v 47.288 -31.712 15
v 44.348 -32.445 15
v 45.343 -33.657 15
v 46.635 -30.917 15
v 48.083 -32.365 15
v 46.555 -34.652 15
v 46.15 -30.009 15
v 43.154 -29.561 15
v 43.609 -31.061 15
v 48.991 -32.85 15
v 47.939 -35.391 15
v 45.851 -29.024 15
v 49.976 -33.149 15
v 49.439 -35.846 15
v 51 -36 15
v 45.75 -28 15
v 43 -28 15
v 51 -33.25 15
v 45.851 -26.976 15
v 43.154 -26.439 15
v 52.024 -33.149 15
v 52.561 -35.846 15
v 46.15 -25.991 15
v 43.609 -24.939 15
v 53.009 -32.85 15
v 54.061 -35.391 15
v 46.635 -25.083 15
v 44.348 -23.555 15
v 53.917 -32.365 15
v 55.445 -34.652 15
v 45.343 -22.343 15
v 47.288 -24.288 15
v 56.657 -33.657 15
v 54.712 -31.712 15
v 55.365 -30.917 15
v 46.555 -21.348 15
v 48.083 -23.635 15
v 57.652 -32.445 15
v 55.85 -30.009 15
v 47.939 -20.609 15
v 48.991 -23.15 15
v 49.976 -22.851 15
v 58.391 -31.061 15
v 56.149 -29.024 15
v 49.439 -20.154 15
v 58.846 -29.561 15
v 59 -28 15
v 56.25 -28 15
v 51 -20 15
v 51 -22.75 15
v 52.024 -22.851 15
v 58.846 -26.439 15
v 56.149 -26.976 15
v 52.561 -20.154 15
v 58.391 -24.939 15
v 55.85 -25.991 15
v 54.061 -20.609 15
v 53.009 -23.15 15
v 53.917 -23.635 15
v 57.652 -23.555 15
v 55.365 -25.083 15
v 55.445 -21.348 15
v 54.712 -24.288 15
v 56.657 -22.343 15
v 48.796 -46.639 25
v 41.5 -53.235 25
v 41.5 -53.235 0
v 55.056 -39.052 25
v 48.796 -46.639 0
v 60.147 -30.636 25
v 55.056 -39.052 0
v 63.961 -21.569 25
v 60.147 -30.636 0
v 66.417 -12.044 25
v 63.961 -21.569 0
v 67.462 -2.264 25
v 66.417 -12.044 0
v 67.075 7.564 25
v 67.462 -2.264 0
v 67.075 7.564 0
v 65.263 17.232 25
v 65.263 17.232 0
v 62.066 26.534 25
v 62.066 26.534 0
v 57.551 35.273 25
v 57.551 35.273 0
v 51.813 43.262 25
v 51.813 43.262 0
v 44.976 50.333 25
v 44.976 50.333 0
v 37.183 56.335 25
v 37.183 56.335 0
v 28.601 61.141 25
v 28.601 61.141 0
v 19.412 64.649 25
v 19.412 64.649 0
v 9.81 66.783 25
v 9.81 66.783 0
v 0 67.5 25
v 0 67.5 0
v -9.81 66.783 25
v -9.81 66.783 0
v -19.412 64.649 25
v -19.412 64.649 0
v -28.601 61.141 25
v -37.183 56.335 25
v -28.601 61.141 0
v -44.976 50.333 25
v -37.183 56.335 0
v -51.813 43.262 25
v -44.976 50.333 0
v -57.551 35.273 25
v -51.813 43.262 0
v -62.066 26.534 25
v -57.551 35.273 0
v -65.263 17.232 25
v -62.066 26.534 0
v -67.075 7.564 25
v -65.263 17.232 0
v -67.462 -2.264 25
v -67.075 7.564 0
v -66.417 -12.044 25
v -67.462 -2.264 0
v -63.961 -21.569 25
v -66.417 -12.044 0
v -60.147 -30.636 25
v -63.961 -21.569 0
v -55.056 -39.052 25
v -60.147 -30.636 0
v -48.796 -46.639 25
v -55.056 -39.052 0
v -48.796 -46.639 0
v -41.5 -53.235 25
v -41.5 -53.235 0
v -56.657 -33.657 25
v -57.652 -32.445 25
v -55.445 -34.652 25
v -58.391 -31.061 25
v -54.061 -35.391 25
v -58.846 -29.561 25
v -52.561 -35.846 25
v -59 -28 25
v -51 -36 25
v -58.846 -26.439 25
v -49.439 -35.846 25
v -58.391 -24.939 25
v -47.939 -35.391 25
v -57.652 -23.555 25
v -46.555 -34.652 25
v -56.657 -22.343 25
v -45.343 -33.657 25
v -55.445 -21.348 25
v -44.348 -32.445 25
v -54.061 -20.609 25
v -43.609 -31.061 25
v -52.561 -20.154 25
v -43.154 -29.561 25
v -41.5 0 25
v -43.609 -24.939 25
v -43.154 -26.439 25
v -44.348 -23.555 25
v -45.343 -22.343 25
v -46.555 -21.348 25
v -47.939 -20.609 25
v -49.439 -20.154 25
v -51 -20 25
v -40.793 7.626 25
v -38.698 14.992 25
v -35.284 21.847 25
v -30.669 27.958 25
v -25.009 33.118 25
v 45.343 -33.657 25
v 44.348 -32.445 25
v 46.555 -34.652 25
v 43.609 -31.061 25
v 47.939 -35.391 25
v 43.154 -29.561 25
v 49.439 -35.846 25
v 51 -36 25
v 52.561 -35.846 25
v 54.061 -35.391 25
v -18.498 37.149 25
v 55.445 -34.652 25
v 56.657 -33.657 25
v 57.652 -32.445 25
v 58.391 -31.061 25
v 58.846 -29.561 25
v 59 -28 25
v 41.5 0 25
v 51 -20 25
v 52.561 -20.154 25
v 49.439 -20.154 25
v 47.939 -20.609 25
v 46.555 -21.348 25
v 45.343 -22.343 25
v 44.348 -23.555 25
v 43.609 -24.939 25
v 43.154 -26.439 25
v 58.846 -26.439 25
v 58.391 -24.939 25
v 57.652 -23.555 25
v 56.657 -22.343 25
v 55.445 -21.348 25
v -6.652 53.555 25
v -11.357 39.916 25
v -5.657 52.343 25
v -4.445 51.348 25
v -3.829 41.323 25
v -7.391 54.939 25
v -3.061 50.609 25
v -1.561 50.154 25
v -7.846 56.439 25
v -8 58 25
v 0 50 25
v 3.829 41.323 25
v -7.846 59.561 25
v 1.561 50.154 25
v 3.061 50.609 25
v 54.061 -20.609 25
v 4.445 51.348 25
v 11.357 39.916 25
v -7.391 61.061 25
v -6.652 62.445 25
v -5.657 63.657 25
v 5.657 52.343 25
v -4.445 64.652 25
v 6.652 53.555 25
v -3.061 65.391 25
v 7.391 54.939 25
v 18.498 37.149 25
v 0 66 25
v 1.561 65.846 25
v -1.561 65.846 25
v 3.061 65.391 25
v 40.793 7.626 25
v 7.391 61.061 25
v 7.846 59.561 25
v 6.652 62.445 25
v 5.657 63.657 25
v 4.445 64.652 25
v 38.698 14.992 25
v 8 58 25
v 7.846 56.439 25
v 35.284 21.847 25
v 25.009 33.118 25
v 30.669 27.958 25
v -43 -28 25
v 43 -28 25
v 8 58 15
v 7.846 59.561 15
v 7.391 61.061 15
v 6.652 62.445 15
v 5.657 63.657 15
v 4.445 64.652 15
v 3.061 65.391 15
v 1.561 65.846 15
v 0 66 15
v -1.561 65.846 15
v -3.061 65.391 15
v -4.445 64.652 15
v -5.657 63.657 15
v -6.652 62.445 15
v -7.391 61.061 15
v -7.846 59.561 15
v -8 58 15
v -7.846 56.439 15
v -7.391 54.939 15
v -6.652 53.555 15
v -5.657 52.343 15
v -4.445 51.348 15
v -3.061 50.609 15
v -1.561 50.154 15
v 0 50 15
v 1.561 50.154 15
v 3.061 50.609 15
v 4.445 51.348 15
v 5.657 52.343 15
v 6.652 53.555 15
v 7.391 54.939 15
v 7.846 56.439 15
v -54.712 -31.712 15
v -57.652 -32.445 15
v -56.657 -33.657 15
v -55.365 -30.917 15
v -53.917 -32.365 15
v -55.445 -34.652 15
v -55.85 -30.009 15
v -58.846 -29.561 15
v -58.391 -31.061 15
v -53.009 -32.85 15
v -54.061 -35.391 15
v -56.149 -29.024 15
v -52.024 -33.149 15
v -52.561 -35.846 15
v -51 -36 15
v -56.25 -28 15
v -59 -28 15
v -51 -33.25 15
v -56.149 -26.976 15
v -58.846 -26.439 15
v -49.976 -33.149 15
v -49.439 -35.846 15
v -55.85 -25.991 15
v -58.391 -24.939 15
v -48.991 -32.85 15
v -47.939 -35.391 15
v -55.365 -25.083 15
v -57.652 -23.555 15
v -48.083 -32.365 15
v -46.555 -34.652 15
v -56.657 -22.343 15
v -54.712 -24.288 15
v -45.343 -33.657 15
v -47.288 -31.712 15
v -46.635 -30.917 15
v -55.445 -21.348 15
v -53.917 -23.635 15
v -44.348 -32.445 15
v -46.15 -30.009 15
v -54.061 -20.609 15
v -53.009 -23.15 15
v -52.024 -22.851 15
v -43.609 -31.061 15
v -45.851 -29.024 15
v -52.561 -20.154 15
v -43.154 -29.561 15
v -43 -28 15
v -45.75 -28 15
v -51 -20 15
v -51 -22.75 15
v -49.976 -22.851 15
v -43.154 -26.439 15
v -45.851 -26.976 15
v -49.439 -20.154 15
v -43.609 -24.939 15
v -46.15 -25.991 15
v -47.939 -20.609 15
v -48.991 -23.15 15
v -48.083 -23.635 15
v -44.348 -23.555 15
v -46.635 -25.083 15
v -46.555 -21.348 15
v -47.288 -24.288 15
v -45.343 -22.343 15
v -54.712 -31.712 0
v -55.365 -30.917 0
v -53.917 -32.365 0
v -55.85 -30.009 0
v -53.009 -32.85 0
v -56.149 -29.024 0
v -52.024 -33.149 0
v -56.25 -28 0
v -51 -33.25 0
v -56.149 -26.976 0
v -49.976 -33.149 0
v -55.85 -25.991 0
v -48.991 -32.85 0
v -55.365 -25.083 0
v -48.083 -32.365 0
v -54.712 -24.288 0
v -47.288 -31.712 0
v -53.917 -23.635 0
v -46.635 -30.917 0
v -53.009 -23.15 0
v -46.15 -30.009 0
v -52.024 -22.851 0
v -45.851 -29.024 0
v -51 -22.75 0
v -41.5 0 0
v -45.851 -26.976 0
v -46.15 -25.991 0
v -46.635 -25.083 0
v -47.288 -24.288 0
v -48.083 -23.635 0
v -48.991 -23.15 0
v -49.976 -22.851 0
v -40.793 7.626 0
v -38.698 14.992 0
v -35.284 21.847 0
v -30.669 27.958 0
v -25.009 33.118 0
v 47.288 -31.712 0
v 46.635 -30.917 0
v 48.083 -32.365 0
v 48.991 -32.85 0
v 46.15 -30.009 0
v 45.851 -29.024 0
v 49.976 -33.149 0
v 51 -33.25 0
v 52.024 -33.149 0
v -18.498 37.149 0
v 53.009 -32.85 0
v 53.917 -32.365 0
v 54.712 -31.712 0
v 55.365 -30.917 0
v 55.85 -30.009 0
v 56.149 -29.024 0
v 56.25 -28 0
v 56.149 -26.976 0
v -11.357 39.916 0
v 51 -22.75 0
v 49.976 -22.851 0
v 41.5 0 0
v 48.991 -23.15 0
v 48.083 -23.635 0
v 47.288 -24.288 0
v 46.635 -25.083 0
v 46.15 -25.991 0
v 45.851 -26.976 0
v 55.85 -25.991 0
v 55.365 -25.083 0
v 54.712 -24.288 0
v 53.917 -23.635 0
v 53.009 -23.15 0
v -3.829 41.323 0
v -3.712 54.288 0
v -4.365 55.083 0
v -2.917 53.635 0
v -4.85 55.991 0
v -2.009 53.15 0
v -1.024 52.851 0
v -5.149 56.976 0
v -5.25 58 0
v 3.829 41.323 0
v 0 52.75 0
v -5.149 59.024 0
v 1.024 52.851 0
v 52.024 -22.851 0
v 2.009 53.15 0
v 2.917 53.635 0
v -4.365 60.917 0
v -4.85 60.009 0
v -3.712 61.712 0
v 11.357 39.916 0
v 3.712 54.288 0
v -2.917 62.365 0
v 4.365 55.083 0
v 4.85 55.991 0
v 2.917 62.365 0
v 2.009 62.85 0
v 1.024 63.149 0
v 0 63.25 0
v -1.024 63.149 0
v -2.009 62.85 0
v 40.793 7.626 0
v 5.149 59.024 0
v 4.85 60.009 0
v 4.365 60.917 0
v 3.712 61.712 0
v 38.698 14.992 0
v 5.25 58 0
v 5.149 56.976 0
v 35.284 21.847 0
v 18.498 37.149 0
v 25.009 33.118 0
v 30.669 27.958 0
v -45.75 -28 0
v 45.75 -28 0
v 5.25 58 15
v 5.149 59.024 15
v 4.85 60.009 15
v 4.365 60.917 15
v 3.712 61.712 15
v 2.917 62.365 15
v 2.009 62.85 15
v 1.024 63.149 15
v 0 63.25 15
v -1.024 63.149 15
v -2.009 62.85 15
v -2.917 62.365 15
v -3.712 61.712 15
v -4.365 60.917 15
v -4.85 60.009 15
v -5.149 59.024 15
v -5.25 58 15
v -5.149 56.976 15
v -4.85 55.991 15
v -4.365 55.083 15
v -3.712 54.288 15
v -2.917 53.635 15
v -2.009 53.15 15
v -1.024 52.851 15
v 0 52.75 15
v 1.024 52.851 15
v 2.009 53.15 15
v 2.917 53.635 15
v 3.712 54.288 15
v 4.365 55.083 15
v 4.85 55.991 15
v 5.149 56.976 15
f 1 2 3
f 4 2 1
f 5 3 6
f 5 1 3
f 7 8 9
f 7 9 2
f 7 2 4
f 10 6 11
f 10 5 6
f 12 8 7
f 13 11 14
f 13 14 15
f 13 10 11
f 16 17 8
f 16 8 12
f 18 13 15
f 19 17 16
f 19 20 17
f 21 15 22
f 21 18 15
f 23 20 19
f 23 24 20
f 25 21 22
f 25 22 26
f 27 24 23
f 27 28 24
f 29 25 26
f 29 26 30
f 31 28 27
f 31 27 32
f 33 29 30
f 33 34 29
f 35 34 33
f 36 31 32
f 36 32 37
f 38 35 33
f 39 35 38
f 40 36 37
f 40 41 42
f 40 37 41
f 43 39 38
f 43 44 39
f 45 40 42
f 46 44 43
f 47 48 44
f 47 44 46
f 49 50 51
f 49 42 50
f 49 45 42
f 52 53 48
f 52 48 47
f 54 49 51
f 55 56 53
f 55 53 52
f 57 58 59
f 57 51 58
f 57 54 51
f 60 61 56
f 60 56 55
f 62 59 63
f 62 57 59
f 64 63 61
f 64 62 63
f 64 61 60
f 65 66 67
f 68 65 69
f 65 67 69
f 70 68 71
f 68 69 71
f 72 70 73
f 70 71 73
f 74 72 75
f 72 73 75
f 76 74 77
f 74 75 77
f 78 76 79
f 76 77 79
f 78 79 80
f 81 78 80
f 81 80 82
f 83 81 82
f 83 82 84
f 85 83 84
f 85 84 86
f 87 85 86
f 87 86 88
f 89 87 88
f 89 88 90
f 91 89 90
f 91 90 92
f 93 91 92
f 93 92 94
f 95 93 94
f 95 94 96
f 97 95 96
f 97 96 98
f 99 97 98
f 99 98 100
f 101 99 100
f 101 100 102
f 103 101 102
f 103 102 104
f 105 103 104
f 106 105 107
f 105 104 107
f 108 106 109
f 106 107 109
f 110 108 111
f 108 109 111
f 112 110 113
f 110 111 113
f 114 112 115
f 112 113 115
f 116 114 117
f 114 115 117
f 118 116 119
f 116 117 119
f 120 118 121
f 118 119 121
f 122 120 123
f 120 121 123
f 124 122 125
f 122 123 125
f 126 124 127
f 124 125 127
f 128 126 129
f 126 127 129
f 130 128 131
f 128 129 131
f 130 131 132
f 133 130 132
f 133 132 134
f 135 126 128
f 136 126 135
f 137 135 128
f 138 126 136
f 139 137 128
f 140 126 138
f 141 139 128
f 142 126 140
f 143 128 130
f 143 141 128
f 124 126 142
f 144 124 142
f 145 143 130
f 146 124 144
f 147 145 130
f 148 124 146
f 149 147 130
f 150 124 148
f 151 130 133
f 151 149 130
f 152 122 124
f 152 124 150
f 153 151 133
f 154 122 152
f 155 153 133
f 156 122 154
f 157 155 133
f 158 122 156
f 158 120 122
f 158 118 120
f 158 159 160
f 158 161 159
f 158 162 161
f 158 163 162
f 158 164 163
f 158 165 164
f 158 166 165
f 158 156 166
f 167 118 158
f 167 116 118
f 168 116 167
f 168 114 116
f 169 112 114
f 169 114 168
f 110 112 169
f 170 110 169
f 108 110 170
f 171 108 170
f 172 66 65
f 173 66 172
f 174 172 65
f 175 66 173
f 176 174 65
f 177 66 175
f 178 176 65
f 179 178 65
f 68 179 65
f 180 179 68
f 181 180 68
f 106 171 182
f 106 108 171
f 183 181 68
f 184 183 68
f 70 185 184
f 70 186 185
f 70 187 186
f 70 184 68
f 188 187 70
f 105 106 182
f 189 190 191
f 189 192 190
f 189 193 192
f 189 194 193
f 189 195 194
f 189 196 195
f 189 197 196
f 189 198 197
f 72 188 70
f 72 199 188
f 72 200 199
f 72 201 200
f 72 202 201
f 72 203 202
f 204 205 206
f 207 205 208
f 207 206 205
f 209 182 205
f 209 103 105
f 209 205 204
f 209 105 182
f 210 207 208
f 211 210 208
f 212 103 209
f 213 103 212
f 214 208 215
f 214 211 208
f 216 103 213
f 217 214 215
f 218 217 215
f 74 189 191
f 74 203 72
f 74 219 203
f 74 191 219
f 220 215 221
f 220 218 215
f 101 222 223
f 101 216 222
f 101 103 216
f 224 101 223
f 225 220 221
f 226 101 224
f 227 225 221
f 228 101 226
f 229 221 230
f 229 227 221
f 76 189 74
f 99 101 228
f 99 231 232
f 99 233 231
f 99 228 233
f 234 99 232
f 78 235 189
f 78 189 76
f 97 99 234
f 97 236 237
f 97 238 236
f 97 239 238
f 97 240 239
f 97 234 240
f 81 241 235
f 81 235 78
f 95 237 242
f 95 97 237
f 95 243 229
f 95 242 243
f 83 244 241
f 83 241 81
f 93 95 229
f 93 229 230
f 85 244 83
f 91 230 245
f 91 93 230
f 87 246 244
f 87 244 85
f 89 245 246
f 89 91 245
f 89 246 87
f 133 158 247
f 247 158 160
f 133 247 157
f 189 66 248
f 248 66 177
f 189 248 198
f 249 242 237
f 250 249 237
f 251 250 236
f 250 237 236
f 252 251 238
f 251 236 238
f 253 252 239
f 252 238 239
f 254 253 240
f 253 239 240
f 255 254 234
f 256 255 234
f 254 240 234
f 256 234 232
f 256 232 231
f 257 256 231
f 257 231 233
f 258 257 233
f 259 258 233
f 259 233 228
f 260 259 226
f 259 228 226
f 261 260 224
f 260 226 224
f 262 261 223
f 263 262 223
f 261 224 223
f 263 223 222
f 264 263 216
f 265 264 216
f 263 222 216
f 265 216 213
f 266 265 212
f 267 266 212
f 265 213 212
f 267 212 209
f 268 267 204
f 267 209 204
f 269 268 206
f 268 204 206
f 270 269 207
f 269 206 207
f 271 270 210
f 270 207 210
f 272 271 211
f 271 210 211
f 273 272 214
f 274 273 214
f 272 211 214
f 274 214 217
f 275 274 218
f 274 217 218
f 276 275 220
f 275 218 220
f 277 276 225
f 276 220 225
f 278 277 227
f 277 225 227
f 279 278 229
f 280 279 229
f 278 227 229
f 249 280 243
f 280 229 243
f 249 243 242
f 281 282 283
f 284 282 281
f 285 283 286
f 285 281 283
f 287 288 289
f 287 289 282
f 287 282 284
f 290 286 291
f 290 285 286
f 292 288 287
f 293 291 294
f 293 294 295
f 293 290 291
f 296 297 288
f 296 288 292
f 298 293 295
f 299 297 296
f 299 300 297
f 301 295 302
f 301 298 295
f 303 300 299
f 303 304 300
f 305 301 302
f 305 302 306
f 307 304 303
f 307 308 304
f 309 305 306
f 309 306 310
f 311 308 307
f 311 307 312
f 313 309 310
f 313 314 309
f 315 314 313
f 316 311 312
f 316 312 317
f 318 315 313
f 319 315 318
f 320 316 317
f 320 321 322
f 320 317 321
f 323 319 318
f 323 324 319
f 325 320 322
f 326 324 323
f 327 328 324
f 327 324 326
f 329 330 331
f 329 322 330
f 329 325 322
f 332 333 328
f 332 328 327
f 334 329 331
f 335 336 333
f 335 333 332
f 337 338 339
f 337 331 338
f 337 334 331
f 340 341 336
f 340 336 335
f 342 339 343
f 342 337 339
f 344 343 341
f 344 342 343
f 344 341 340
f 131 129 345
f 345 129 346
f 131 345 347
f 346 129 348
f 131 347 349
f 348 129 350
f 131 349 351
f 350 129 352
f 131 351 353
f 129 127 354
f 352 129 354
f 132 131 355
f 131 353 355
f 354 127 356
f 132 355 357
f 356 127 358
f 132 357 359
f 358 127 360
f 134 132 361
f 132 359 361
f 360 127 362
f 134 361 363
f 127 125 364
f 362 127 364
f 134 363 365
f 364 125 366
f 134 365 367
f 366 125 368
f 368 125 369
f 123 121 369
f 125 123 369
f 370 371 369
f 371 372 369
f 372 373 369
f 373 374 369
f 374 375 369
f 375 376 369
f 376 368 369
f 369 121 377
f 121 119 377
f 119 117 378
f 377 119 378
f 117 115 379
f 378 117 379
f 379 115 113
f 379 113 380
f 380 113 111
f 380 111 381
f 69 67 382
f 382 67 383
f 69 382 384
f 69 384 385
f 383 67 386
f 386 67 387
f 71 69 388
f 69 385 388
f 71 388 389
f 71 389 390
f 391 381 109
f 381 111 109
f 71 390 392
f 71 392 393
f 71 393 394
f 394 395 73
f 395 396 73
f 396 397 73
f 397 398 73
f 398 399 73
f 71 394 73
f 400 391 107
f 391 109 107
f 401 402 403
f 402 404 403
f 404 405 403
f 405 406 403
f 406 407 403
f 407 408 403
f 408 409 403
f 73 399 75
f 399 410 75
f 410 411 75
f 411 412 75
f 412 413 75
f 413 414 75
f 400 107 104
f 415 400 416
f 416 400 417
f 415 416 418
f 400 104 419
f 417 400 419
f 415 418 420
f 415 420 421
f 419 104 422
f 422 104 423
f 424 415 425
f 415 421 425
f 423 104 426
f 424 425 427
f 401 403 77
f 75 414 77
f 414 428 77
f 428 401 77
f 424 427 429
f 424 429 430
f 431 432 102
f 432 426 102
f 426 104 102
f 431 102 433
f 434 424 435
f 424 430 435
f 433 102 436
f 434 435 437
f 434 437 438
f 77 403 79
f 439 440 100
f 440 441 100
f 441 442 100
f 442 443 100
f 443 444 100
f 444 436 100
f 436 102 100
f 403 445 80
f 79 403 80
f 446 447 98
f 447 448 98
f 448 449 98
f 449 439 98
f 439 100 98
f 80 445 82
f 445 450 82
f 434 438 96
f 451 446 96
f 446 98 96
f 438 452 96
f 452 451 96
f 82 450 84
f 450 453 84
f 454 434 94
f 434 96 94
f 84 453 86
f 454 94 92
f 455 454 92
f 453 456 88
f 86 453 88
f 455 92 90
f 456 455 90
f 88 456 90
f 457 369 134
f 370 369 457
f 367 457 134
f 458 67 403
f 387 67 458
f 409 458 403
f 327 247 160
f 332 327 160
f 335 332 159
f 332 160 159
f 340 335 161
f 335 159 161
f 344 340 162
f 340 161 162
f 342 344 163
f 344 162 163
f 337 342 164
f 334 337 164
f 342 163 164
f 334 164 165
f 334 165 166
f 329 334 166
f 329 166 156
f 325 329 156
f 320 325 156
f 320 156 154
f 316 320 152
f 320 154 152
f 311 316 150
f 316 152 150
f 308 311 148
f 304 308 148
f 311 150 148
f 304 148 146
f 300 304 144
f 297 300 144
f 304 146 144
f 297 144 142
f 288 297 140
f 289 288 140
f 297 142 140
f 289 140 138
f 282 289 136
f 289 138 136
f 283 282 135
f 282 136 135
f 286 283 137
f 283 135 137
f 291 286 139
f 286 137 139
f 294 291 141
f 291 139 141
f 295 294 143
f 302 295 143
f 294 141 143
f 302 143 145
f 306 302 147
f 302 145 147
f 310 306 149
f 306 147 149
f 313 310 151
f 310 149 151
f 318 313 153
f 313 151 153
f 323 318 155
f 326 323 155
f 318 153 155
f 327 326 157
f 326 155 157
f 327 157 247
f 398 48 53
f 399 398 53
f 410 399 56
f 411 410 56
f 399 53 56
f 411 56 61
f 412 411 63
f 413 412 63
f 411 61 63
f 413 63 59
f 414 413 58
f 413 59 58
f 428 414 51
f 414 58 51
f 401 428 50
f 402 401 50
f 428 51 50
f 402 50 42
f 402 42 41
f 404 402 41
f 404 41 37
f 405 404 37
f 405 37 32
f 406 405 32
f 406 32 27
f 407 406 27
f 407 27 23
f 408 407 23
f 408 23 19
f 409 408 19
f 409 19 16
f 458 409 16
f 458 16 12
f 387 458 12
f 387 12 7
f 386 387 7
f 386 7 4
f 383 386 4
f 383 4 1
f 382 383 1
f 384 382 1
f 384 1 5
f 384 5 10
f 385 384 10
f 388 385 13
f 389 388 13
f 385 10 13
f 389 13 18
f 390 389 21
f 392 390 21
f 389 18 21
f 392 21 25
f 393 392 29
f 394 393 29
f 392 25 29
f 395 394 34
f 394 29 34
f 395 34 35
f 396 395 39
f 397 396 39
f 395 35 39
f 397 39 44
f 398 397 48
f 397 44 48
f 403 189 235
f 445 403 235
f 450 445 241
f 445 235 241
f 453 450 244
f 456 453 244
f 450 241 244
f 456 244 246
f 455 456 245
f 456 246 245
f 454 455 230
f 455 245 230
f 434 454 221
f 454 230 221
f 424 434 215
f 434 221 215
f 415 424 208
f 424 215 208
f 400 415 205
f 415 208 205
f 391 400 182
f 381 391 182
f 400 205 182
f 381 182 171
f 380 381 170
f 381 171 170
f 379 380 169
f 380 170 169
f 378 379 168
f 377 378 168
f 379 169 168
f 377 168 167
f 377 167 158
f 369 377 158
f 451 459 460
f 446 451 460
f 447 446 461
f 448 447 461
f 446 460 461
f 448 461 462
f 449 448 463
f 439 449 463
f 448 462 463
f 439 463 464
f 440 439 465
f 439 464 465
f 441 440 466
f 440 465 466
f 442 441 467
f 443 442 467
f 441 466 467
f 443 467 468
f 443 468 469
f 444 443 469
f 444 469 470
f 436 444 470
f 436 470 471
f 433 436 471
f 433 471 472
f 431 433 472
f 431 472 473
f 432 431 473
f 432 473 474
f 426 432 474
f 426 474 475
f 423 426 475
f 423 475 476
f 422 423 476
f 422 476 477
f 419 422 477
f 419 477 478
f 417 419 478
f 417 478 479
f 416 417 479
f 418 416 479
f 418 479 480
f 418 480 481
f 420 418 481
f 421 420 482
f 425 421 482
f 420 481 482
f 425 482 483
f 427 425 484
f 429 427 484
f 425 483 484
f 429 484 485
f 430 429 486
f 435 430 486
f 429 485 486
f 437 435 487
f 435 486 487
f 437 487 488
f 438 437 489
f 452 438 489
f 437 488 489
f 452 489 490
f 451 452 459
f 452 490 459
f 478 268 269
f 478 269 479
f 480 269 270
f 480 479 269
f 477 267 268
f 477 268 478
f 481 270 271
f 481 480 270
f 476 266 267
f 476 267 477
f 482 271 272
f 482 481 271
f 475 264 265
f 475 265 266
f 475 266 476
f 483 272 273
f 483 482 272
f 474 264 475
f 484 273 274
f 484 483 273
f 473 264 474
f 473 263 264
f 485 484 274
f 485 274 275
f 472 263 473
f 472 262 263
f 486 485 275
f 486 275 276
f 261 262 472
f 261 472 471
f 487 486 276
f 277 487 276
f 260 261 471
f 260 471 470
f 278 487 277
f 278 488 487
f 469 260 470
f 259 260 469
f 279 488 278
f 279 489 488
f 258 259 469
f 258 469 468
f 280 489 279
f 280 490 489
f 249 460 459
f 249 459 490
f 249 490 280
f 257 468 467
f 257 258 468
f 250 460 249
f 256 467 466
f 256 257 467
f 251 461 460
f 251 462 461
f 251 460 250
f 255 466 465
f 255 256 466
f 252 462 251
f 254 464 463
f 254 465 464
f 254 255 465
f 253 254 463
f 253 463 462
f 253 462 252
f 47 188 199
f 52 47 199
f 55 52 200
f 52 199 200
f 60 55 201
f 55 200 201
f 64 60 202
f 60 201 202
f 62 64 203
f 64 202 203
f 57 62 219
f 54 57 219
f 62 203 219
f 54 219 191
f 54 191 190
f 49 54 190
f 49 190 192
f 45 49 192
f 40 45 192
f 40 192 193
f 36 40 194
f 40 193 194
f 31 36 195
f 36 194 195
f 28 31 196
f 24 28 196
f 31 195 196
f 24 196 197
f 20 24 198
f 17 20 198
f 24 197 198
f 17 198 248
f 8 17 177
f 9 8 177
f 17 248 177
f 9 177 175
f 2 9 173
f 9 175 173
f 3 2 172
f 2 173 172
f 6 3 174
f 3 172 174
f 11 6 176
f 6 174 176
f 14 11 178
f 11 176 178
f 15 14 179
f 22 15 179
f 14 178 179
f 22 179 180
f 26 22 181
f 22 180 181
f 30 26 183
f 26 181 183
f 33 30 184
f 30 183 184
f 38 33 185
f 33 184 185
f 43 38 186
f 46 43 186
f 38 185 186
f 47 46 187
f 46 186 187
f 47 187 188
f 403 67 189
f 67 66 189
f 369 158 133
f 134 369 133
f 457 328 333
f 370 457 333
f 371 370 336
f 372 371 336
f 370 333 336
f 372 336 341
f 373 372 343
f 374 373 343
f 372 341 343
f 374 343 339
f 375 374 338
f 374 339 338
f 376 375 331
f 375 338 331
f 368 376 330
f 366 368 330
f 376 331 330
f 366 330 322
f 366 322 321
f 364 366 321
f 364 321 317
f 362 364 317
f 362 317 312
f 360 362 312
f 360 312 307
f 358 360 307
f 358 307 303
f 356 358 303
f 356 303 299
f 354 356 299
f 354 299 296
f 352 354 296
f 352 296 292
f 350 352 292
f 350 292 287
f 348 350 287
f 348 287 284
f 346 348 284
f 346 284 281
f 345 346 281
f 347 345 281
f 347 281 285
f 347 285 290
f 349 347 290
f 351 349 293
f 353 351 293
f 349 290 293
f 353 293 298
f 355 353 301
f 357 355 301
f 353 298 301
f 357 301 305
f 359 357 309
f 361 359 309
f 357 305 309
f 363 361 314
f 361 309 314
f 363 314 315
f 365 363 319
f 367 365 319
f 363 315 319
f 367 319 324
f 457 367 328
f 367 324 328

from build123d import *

# Parameters (mm, degrees)
F0_R     = 67.5
F1_DEPTH = 25
F3_DEPTH = 25.001
F4_R     = 5.25
F5_DEPTH = 25.001
F4_R_2   = 8
F6_DEPTH = 10


with BuildPart() as f1:
    # F0 (on Top) → F1 (new body)
    with BuildSketch(Plane.XY):
        Circle(F0_R)
    extrude(amount=F1_DEPTH)

    # F2 (on face) → F3 (cut, through all)
    with BuildSketch(Plane.XY.offset(25)):
        with BuildLine():
            ThreePointArc((-41.5, 0), (0, -41.5), (41.5, 0))
            ThreePointArc((41.5, 0), (0, 41.5), (-41.5, 0))
        make_face()
        with BuildLine():
            Line((41.5, -53.235327), (41.5, 0))
            ThreePointArc((41.5, 0), (0, -41.5), (-41.5, 0))
            Line((-41.5, 0), (-41.5, -53.235327))
            ThreePointArc((-41.5, -53.235327), (0, -67.5), (41.5, -53.235327))
        make_face()
    extrude(amount=-F3_DEPTH, mode=Mode.SUBTRACT)

    # F4 (on face) → F5 (cut, through all)
    with BuildSketch(Plane.XY.offset(25)):
        with Locations((51, -28)):
            Circle(F4_R)
        with Locations((-51, -28)):
            Circle(F4_R)
        with Locations((0, 58)):
            Circle(F4_R)
    extrude(amount=-F5_DEPTH, mode=Mode.SUBTRACT)

    # F4 (on face) → F6 (cut)
    with BuildSketch(Plane.XY.offset(25)):
        with Locations((51, -28)):
            Circle(F4_R_2)
        with Locations((51, -28)):
            Circle(F4_R, mode=Mode.SUBTRACT)
        with Locations((0, 58)):
            Circle(F4_R_2)
        with Locations((0, 58)):
            Circle(F4_R, mode=Mode.SUBTRACT)
        with Locations((-51, -28)):
            Circle(F4_R_2)
        with Locations((-51, -28)):
            Circle(F4_R, mode=Mode.SUBTRACT)
    extrude(amount=-F6_DEPTH, mode=Mode.SUBTRACT)


solid = f1.part
